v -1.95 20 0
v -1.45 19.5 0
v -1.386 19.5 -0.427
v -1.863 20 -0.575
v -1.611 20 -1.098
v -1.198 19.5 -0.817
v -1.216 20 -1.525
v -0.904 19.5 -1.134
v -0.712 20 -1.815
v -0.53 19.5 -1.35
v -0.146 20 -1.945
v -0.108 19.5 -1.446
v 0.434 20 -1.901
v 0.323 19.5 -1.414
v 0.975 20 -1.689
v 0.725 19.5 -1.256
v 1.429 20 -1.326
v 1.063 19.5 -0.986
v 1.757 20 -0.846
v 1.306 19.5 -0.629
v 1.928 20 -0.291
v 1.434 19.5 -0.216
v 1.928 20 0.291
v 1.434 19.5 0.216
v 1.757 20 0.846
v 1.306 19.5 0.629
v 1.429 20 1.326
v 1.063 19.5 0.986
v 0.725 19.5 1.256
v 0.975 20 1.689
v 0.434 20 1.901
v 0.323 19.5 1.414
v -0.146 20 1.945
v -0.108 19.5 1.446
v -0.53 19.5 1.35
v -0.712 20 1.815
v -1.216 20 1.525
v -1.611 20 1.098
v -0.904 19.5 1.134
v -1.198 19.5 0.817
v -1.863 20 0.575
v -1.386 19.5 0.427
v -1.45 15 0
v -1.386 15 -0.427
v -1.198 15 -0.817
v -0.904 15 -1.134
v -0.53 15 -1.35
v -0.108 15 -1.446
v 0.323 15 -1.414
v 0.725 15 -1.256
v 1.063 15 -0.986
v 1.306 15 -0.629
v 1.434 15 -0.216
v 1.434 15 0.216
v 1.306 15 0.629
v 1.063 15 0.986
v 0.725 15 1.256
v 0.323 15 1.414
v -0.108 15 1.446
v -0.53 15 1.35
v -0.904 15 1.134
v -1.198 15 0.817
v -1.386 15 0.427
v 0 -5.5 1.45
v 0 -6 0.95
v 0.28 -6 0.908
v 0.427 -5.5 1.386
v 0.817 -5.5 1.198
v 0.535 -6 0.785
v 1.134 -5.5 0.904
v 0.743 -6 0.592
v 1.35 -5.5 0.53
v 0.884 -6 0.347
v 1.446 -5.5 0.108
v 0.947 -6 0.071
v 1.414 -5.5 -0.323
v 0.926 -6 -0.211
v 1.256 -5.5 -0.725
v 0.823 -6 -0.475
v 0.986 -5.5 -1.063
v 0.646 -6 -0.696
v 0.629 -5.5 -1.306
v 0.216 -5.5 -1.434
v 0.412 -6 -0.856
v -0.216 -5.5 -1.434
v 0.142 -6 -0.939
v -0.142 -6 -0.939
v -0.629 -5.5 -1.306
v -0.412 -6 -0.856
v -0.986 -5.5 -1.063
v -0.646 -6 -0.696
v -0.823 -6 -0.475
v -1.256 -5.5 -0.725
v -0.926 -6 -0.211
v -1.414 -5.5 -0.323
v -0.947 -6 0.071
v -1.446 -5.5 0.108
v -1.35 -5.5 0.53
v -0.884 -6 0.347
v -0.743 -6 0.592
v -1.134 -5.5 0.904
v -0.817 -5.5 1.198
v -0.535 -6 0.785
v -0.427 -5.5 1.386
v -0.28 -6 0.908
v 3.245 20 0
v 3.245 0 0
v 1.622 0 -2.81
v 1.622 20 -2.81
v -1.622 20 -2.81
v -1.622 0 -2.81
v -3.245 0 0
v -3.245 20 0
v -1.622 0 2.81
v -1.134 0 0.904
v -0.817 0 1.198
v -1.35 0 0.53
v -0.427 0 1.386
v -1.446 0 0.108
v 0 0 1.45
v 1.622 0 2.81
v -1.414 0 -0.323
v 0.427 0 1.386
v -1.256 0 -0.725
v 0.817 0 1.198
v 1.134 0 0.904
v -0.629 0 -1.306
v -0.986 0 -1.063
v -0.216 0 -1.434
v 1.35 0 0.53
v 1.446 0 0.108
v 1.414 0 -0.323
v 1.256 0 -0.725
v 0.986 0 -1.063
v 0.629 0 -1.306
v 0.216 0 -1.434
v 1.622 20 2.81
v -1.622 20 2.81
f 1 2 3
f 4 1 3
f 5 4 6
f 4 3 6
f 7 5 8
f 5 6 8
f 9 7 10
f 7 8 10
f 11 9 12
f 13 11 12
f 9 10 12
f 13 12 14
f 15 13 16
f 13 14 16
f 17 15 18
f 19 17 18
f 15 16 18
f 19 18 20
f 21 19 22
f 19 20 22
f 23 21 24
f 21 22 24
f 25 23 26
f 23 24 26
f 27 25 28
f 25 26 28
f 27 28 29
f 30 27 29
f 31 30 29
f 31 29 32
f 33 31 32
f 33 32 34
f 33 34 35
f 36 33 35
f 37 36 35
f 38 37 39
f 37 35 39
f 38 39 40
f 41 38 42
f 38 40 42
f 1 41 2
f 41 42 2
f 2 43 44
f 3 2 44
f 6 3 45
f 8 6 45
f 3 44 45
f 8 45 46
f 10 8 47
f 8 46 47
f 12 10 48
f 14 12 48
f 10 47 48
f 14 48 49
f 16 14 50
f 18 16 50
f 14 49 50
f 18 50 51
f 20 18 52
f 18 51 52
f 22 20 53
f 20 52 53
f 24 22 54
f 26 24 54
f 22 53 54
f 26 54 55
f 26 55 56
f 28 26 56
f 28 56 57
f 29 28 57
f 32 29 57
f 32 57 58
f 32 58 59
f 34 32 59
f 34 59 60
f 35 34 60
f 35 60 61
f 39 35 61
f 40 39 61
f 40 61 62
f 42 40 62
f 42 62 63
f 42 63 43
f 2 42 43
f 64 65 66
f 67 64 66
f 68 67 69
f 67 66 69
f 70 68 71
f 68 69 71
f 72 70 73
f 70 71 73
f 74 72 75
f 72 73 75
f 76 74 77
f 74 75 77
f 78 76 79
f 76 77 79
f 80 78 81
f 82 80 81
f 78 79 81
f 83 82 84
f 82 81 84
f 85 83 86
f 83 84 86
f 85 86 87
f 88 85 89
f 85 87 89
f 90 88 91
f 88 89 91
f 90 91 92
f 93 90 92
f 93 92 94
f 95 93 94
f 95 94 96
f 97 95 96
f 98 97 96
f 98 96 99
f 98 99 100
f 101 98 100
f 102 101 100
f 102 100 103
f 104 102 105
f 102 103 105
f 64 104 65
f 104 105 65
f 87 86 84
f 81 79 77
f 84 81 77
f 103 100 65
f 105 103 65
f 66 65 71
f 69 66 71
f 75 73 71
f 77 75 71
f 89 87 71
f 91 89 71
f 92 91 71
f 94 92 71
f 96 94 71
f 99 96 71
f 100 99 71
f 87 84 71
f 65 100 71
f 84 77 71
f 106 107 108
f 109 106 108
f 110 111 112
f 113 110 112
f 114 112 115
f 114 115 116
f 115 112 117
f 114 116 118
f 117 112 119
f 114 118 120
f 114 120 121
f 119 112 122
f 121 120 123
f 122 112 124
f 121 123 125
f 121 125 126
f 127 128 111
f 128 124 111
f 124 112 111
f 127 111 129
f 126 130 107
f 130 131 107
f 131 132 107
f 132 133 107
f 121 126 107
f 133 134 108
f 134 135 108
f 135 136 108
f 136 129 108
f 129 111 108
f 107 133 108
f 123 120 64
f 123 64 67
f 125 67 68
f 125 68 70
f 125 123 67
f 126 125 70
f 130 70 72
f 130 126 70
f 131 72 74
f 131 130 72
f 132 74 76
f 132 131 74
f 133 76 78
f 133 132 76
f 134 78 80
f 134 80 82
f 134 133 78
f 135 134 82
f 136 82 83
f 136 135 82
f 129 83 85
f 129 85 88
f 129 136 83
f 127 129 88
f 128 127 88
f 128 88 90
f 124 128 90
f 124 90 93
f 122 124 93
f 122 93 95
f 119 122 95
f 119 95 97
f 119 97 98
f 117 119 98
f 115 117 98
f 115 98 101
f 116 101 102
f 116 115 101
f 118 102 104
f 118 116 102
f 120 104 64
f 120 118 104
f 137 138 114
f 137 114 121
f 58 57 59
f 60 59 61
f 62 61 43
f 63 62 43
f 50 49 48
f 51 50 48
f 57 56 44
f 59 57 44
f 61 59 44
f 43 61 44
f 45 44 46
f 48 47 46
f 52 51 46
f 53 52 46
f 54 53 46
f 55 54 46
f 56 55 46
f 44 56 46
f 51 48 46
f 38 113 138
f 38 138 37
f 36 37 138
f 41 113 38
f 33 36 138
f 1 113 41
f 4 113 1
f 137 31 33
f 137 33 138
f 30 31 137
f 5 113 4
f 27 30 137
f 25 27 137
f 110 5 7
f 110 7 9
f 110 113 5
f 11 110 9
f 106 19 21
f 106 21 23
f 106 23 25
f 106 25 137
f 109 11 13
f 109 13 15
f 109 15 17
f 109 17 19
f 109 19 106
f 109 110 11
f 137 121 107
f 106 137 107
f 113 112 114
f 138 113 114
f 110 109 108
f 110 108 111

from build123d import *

# Parameters (mm, degrees)
BOSS_EXTRUDE1_DEPTH            = 20
SKETCH2_W                      = 1.45
SKETCH2_H                      = 6
F_2_9_2_9_DIAMETER_HOLE1_D     = 2.9
F_2_9_2_9_DIAMETER_HOLE1_DEPTH = 5
CHAMFER1_SIZE                  = 0.5


with BuildPart() as part:
    # Sketch1 → Boss-Extrude1 (new body)
    with BuildSketch(Plane(origin=(0, 20, 0), x_dir=(1, 0, 0), z_dir=(0, 1, 0))):
        Polygon((1.622354256, -2.81), (3.244708513, 0), (1.622354256, 2.81), (-1.622354256, 2.81), (-3.244708513, 0), (-1.622354256, -2.81), align=None)
    extrude(amount=-BOSS_EXTRUDE1_DEPTH)

    # Sketch2 → Revolve1 (revolve)
    with BuildSketch(Plane(origin=(0, 0, 0), x_dir=(-1, 0, 0), z_dir=(0, 0, -1)), mode=Mode.PRIVATE) as revolve1_sk:
        with Locations((-0.725, -3)):
            Rectangle(SKETCH2_W, SKETCH2_H)
    revolve(revolve1_sk.sketch.rotate(Axis((0, -6, 0), (0, 1, 0)), 270), axis=Axis((0, -6, 0), (0, 1, 0)))

    # Ø2.9 (2.9) Diameter Hole1
    with Locations(Plane(origin=(0, 20, 0), x_dir=(1, 0, 0), z_dir=(0, 1, 0))):
        with Locations((0, 0)):
            Hole(F_2_9_2_9_DIAMETER_HOLE1_D / 2, depth=F_2_9_2_9_DIAMETER_HOLE1_DEPTH)

    # Chamfer1
    chamfer1_edges = [part.edges().sort_by_distance(p)[0] for p in [
        (0, -6, -1.45),
        (1.45, 20, 0),
    ]]
    chamfer(chamfer1_edges, length=CHAMFER1_SIZE)


solid = part.part
